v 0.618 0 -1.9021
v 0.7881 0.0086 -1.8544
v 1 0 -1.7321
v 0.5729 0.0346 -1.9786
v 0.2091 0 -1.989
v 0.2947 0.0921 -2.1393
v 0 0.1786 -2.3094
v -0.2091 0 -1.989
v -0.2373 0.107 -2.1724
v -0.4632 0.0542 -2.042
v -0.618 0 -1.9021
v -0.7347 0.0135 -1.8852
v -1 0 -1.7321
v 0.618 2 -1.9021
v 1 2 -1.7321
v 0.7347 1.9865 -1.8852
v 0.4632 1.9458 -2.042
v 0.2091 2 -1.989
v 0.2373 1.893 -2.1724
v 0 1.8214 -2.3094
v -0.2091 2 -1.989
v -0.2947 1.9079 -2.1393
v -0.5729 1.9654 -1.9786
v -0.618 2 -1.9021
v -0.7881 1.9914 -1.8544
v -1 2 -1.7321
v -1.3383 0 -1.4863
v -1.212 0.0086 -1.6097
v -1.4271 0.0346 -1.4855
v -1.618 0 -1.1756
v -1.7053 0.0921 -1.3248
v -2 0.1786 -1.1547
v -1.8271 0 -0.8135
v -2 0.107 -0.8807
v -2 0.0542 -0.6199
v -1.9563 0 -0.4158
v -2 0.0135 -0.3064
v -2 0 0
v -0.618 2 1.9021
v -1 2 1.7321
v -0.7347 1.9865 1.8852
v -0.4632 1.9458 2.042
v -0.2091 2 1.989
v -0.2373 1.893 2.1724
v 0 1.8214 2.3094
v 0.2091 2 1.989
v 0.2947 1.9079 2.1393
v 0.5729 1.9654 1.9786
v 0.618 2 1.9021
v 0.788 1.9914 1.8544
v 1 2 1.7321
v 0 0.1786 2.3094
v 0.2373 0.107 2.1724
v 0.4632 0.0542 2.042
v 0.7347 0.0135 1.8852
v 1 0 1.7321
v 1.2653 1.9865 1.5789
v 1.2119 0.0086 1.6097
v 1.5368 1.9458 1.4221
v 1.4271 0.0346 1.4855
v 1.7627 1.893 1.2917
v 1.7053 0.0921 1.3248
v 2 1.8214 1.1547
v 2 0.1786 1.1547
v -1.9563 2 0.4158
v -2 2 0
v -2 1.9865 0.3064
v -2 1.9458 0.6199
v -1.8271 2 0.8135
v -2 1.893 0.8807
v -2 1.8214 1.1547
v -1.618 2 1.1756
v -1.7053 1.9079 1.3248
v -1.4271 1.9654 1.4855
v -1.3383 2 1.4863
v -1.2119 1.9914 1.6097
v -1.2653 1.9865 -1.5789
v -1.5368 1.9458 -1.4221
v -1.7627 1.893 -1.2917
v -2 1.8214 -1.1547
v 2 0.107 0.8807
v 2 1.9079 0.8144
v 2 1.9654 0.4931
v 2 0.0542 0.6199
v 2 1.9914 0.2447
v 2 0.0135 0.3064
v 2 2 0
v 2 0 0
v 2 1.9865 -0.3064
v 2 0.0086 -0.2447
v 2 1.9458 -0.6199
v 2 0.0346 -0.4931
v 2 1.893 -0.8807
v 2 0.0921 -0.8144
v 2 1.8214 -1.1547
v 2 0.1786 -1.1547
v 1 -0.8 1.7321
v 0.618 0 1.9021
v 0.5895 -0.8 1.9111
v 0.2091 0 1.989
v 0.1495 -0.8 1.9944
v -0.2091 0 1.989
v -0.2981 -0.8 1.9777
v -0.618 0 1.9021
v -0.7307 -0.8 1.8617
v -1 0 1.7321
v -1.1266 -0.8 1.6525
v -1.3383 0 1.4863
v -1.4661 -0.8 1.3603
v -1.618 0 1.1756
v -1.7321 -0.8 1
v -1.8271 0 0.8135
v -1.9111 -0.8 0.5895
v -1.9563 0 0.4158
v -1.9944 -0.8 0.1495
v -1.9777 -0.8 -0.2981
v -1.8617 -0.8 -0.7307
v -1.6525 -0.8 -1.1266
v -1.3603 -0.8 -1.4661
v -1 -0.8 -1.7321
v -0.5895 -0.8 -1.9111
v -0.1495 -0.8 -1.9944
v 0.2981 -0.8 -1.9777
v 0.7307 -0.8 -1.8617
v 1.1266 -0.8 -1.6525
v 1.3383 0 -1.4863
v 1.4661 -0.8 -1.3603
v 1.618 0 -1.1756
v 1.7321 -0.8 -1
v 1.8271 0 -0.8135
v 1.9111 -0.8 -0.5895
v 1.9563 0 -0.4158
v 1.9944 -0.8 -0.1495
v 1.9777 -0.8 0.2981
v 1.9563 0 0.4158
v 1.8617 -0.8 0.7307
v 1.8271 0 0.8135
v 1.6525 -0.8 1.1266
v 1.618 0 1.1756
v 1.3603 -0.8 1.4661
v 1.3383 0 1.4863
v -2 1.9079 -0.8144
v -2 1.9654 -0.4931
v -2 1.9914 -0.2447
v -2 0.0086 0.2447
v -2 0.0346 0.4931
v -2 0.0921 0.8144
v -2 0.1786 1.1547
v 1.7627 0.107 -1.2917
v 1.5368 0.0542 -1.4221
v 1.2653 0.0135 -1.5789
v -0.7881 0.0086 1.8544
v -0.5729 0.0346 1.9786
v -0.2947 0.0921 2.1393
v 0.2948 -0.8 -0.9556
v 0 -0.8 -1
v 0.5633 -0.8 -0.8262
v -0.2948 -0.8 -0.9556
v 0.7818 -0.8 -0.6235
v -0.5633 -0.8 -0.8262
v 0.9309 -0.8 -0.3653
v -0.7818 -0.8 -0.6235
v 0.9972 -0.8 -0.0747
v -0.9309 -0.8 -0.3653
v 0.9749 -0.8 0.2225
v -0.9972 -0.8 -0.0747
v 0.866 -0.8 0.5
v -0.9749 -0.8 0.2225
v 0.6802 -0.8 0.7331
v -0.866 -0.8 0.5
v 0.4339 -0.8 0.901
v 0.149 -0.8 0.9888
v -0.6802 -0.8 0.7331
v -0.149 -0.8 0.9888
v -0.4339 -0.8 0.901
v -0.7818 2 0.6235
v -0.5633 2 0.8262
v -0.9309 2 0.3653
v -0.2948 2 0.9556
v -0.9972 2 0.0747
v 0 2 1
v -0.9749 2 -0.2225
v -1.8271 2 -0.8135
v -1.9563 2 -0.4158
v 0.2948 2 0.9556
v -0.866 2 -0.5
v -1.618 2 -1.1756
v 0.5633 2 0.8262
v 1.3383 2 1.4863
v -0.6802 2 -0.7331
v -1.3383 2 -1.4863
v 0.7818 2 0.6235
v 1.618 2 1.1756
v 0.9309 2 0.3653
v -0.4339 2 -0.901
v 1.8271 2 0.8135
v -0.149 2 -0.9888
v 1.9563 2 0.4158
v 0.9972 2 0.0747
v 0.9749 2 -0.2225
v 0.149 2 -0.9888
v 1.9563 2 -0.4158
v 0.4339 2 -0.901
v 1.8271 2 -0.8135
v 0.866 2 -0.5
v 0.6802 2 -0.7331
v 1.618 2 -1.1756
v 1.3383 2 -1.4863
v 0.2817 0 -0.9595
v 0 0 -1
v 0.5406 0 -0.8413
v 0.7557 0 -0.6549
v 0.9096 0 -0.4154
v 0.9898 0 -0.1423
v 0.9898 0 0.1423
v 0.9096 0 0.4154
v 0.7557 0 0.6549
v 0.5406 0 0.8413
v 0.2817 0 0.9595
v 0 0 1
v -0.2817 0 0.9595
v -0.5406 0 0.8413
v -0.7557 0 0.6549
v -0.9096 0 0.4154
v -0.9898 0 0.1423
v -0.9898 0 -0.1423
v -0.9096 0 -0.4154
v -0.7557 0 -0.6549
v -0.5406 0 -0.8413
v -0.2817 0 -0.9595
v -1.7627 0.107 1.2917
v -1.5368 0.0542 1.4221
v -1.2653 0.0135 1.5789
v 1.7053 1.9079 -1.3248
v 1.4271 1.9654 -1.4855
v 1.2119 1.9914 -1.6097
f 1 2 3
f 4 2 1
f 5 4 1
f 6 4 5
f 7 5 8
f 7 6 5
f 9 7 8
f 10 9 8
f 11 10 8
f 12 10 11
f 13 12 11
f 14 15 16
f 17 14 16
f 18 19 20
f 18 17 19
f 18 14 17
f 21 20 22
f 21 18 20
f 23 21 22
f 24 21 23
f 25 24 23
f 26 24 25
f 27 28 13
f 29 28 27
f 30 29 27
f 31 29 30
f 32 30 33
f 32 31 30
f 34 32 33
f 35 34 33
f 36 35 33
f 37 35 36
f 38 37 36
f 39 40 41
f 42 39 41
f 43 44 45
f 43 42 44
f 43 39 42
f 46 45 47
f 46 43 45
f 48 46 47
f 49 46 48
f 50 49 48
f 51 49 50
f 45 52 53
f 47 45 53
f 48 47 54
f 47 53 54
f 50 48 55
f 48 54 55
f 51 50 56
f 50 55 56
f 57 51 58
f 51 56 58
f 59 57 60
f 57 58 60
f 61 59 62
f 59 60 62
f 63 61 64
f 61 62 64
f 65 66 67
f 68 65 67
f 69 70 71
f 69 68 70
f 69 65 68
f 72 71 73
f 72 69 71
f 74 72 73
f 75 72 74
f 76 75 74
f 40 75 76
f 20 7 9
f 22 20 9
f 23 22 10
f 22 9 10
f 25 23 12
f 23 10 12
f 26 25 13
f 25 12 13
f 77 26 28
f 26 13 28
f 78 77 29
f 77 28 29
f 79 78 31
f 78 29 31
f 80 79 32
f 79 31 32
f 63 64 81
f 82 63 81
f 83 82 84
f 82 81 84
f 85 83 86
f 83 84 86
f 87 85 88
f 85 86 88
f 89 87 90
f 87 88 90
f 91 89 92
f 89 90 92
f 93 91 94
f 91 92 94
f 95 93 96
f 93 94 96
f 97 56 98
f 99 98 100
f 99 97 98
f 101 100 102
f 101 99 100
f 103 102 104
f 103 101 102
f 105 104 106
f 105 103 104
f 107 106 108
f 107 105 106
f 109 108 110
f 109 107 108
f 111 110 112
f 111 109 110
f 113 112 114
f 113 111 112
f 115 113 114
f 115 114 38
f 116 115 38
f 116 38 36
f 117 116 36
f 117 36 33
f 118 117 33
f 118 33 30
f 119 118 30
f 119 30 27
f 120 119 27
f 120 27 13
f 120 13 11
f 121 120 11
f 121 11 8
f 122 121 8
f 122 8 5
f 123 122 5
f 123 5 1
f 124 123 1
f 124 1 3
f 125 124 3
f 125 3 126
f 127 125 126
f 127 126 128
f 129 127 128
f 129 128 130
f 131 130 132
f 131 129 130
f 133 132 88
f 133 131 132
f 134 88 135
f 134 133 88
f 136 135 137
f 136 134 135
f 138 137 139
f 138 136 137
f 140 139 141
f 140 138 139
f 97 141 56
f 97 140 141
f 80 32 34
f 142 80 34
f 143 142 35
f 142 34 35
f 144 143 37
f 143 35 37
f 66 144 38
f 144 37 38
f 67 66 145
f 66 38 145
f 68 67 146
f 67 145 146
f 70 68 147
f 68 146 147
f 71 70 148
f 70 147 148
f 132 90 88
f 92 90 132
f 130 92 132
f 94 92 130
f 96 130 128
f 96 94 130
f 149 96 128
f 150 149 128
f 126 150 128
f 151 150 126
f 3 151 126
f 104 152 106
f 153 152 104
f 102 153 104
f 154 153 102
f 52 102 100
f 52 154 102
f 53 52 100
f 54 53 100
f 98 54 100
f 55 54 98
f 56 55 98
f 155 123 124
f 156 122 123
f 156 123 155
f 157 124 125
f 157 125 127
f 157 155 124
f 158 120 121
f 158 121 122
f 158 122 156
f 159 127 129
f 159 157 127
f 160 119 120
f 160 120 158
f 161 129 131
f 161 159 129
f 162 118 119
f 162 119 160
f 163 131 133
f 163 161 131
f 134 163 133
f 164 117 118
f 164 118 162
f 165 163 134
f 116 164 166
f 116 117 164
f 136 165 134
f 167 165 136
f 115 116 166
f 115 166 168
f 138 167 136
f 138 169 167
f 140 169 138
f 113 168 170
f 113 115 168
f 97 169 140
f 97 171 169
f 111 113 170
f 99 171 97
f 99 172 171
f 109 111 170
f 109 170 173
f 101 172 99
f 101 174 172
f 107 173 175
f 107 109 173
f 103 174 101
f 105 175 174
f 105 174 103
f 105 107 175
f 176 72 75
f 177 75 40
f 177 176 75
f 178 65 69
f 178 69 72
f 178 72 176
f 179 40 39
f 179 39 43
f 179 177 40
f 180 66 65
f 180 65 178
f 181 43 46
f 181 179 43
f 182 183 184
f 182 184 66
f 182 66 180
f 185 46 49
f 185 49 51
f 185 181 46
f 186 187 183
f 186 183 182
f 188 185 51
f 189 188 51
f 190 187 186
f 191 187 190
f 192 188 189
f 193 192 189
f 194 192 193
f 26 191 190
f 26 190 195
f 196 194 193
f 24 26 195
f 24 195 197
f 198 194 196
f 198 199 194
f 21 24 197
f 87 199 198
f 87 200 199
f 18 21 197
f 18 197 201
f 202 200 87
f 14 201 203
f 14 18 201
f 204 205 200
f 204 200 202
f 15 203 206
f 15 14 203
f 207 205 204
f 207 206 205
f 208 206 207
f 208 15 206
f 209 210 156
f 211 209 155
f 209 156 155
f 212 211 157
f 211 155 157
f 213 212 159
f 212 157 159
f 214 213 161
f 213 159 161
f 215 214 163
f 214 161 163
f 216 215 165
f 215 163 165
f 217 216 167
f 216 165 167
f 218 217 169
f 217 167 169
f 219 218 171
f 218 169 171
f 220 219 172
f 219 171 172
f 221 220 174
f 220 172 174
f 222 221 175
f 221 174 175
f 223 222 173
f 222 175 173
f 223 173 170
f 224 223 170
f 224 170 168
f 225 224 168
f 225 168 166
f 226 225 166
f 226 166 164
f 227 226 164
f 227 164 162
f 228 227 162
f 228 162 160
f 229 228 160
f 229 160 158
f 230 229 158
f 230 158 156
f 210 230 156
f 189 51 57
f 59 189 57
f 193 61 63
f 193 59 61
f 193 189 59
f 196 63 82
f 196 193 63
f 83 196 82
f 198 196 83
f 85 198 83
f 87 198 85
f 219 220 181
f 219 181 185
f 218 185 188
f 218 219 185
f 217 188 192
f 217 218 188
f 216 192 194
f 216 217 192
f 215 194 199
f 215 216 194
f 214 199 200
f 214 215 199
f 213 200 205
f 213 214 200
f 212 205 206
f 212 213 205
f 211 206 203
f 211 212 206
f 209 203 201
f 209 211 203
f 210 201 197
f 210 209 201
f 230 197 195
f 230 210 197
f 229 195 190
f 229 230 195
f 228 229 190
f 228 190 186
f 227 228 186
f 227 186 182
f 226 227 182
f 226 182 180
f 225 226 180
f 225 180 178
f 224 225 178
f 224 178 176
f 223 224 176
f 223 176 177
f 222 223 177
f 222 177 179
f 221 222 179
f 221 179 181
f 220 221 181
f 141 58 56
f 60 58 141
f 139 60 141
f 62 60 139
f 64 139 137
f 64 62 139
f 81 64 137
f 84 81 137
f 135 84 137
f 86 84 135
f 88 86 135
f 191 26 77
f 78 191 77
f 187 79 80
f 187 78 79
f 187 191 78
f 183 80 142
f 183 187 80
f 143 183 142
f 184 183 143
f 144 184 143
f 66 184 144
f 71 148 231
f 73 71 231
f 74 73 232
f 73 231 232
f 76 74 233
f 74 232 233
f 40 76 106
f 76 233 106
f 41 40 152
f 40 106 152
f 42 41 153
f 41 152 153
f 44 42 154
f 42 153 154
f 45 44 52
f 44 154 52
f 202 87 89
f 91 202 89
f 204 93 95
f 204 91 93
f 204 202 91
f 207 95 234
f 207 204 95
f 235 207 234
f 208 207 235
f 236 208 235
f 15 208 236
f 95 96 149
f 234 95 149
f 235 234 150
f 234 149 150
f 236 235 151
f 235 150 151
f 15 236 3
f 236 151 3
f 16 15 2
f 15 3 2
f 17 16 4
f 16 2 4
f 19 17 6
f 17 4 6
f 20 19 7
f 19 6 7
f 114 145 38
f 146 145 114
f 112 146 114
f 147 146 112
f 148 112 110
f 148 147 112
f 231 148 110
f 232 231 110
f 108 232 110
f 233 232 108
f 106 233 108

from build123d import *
from build123d.topology import SkipClean

# Parameters (mm, degrees)
SKETCH_1_R      = 1
EXTRUDE_2_DEPTH = 2
EXTRUDE_START   = 0.8
SKETCH_3_R      = 2
SKETCH_3_R_2    = 1
EXTRUDE_3_DEPTH = 0.8


with BuildPart() as part:
    # 草图1 → 凸台-拉伸2 (new body)
    with BuildSketch(Plane(origin=(0, 0, 0), x_dir=(1, 0, 0), z_dir=(0, 1, 0))):
        Polygon((2, 1.154700538), (0, 2.309401077), (-2, 1.154700538), (-2, -1.154700538), (0, -2.309401077), (2, -1.154700538), align=None)
        with Locations(Location((0, 0, 0), (0, 0, 270))):
            Circle(SKETCH_1_R, mode=Mode.SUBTRACT)
    extrude(amount=EXTRUDE_2_DEPTH)

    # 草图2 → 切除-旋转1 (revolve, cut)
    with BuildSketch(Plane.XY):
        Polygon((3.732050808, 1), (2, 2), (3.732050808, 2), align=None)
        Polygon((2, 0), (3.732050808, 1), (3.732050808, 0), align=None)
    revolve(axis=Axis((0, 1.981363764, 0), (0, 1, 0)), mode=Mode.SUBTRACT)

    # 草图3 → 凸台-拉伸3 (add)
    with SkipClean():  # the faces are left unmerged after this step: merging them gives an invalid solid
        with BuildSketch(Plane.XZ.offset(EXTRUDE_START)):
            with Locations(Location((0, 0, 0), (0, 0, 60))):
                Circle(SKETCH_3_R)
            with Locations(Location((0, 0, 0), (0, 0, 270))):
                Circle(SKETCH_3_R_2, mode=Mode.SUBTRACT)
        extrude(amount=-EXTRUDE_3_DEPTH)


solid = part.part
